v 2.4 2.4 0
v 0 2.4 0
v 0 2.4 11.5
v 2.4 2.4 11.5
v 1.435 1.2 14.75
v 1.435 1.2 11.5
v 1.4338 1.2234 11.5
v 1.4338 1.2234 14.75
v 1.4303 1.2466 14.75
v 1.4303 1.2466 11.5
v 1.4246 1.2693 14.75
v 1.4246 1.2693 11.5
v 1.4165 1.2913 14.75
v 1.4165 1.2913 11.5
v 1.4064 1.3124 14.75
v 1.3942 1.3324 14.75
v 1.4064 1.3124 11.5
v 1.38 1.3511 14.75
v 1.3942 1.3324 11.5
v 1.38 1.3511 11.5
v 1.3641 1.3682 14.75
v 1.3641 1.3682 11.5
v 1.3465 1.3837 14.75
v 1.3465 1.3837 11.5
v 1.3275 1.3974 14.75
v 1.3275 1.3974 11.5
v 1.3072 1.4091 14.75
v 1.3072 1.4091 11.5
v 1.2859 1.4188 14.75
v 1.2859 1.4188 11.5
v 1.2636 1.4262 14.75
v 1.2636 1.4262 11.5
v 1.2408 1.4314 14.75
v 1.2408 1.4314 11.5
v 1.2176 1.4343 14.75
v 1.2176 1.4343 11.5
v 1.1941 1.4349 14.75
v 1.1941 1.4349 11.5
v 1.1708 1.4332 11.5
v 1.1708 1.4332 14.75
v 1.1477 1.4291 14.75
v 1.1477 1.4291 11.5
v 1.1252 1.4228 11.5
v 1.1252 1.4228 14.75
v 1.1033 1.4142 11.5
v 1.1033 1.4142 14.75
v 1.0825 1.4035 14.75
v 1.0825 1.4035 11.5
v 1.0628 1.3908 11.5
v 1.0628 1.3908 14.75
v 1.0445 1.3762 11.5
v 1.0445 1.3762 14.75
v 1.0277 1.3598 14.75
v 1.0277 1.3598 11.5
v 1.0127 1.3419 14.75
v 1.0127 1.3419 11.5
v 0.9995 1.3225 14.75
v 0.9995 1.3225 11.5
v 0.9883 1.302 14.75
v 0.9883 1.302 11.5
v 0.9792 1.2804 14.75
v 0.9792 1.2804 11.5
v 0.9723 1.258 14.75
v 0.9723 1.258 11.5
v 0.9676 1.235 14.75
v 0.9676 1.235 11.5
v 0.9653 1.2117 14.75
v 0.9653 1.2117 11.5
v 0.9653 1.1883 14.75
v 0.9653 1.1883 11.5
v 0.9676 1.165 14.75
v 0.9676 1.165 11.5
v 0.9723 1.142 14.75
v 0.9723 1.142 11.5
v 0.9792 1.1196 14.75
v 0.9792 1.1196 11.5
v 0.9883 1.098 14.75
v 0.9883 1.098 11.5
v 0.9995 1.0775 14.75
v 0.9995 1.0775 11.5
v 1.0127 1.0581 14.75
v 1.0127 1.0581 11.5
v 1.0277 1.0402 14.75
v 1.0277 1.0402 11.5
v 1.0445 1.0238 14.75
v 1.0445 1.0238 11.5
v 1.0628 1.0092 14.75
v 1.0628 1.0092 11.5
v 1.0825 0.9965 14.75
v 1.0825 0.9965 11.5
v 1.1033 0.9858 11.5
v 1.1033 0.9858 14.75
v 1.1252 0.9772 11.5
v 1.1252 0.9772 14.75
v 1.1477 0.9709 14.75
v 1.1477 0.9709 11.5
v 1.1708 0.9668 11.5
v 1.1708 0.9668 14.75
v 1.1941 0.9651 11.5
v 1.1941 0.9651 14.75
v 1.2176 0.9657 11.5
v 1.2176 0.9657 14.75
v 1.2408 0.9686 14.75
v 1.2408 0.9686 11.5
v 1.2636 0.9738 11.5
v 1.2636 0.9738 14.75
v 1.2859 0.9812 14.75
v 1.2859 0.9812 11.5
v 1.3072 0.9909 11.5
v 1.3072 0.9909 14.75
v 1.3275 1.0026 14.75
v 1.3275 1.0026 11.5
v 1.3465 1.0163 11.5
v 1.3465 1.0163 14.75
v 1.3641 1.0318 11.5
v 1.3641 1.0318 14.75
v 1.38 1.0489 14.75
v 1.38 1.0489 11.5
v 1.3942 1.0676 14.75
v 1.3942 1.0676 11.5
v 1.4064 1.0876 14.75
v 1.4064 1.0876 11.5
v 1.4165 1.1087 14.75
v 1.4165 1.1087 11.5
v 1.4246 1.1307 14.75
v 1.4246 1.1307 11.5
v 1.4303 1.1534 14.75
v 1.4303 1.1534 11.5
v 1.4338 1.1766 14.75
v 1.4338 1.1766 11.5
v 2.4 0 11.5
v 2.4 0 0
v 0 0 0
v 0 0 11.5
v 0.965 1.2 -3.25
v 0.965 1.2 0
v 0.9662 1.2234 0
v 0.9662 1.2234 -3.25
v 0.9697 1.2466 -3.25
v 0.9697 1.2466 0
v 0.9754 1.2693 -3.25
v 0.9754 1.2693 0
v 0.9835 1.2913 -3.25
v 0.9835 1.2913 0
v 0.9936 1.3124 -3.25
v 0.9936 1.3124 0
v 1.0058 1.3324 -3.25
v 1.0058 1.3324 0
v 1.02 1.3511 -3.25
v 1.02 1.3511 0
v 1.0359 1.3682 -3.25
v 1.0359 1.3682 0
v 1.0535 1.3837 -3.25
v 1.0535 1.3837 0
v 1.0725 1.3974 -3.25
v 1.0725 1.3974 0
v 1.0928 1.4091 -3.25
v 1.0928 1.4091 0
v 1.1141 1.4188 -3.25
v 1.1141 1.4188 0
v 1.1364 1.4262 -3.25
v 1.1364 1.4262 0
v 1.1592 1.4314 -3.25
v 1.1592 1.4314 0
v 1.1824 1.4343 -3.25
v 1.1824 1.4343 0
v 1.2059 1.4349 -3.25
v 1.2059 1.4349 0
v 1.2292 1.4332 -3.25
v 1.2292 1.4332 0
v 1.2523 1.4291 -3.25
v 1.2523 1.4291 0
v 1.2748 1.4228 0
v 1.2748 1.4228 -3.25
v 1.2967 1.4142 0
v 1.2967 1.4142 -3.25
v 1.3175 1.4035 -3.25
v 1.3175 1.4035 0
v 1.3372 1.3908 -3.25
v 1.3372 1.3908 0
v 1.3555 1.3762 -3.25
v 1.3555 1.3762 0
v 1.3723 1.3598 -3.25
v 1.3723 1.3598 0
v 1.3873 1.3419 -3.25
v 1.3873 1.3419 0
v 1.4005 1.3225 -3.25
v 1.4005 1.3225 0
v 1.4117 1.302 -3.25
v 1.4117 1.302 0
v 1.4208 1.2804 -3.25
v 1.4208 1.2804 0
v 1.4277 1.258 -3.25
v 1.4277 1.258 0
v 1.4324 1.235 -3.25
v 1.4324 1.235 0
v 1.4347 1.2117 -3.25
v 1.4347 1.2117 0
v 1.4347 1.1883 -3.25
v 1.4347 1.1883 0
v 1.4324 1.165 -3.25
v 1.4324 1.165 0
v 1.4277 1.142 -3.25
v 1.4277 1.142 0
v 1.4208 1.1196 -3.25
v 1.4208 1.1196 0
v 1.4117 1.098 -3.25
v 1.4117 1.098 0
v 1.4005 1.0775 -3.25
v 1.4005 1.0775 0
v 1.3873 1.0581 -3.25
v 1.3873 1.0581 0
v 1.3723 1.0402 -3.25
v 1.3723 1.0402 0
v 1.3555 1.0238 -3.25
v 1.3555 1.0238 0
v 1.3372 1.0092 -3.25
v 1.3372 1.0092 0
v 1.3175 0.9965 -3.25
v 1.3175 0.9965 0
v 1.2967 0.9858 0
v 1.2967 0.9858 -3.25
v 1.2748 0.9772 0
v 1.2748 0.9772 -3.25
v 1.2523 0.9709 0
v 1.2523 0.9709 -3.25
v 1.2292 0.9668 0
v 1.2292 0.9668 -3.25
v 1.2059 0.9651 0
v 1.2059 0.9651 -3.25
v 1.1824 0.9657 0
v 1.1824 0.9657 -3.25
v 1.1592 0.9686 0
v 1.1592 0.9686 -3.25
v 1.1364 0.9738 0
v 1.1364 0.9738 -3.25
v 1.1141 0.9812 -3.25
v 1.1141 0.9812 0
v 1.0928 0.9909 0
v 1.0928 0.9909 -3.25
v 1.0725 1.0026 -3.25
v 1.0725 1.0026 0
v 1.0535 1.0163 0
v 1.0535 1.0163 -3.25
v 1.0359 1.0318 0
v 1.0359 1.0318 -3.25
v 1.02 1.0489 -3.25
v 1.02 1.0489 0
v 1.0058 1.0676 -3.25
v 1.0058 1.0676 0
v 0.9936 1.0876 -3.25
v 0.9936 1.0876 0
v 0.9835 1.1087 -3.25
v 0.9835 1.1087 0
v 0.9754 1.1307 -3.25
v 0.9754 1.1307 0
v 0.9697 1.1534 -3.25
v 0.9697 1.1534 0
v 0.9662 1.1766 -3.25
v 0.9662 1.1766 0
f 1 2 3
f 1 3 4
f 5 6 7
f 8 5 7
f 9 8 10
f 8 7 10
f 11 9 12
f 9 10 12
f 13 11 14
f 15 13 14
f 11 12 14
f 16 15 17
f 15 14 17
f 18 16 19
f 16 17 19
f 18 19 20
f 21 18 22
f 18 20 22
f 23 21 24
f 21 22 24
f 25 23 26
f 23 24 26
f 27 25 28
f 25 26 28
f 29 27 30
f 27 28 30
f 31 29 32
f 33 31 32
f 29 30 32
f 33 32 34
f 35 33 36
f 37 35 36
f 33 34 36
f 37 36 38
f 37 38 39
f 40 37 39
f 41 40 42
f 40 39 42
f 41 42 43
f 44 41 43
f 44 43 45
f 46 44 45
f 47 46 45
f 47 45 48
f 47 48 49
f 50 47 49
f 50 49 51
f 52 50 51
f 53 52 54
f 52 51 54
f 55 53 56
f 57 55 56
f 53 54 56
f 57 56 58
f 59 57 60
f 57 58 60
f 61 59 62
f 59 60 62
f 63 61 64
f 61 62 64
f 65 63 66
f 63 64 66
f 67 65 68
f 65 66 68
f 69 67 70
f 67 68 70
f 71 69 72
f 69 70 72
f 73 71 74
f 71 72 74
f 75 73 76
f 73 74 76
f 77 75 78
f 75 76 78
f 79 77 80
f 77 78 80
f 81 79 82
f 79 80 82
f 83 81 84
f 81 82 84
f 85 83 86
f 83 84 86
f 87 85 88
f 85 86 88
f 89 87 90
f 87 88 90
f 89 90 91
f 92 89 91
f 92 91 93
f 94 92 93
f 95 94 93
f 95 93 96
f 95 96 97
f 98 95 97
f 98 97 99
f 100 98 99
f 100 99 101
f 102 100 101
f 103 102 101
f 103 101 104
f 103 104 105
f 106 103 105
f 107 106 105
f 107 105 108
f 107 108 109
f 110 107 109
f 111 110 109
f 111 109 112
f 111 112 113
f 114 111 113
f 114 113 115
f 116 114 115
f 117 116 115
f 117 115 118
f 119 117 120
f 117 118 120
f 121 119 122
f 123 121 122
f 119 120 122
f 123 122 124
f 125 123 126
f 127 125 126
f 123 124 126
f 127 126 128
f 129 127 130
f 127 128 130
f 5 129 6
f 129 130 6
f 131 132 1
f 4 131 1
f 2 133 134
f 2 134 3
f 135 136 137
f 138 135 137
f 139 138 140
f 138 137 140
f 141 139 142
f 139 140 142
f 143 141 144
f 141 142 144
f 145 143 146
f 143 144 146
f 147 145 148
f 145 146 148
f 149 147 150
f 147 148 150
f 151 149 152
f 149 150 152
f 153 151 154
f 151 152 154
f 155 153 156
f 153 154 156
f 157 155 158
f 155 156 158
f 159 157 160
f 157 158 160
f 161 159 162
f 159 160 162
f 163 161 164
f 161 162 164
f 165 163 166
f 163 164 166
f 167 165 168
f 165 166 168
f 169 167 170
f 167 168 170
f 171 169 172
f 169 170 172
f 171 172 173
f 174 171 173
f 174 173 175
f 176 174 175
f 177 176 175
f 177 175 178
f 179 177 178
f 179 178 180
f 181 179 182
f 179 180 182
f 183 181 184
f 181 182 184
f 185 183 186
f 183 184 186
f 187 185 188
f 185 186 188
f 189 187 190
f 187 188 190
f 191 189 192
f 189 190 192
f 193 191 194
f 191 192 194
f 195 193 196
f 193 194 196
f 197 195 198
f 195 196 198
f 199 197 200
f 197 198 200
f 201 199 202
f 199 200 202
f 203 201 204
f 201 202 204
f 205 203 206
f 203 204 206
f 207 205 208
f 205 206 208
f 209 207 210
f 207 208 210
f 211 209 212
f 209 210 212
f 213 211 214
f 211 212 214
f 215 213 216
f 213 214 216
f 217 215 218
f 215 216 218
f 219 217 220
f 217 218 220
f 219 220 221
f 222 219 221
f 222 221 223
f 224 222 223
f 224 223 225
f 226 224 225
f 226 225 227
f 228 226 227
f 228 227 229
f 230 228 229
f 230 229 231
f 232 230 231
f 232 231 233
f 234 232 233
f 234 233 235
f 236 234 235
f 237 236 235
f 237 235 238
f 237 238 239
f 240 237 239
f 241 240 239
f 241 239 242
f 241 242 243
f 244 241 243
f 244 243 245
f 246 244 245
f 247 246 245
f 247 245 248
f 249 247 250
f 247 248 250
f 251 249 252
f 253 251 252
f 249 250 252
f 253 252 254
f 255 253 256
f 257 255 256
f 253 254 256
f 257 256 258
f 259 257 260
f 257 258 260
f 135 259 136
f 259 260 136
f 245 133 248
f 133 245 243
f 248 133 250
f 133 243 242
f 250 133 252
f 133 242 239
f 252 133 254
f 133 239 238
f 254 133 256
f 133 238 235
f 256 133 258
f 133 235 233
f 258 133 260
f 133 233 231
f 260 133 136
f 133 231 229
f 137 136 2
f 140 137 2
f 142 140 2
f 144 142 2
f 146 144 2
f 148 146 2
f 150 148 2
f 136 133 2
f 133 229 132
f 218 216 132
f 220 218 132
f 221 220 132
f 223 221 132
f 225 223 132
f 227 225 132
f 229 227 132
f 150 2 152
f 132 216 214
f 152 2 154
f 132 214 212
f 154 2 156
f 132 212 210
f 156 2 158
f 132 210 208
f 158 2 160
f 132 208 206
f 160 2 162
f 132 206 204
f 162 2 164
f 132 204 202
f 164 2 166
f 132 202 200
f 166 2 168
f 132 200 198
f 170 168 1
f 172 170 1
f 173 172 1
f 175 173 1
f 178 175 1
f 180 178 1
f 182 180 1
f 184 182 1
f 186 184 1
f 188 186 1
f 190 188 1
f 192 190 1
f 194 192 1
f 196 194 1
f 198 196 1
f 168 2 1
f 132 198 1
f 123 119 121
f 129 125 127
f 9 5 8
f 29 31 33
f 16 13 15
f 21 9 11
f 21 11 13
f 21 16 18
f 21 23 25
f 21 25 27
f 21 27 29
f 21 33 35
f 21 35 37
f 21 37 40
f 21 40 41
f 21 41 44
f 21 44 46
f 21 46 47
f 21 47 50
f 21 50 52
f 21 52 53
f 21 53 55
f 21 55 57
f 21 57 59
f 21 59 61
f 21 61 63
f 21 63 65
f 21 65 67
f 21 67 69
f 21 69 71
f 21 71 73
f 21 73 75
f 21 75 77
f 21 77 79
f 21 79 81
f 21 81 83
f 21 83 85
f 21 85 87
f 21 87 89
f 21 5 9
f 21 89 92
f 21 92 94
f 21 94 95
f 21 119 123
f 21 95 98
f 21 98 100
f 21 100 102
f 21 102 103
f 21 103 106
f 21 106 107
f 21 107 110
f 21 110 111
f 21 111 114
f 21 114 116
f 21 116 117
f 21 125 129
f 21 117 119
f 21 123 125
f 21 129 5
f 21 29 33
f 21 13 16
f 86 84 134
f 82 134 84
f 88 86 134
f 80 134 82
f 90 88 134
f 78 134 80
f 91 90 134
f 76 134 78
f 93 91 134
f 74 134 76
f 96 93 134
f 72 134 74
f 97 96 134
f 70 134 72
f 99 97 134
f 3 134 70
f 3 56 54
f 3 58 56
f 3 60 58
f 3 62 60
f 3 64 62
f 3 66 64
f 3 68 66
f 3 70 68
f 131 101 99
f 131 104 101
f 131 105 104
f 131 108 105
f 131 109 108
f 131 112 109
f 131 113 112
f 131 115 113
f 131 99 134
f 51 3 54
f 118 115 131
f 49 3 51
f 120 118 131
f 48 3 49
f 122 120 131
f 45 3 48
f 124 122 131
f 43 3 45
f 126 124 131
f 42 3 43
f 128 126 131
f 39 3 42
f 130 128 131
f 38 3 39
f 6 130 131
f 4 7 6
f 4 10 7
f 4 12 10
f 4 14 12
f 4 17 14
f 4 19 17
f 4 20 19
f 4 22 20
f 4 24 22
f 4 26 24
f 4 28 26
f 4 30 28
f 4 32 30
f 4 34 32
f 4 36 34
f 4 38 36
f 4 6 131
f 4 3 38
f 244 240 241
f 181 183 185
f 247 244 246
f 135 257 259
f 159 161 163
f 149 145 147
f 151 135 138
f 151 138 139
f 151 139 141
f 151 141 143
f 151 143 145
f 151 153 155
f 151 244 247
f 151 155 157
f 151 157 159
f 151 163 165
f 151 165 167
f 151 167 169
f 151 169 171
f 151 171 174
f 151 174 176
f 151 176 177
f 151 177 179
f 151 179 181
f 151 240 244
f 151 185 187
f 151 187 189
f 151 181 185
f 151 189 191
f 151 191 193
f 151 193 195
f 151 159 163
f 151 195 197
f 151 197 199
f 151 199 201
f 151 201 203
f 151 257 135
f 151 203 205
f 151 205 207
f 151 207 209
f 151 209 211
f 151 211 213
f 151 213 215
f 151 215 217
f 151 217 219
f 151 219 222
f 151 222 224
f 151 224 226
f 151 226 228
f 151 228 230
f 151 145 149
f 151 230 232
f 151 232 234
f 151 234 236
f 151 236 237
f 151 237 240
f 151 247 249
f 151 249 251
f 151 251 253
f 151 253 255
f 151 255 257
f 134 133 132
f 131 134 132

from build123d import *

# Parameters (mm, degrees)
SKETCH_1_W      = 2.4
SKETCH_1_H      = 2.4
EXTRUDE_1_DEPTH = 11.5
SKETCH_2_R      = 0.235
EXTRUDE_2_DEPTH = 3.25
SKETCH_3_R      = 0.235
EXTRUDE_3_DEPTH = 3.25


with BuildPart() as part:
    # ｽｹｯﾁ1 → ﾎﾞｽ - 押し出し1 (new body)
    with BuildSketch(Plane.XY):
        with Locations((1.2, 1.2)):
            Rectangle(SKETCH_1_W, SKETCH_1_H)
    extrude(amount=EXTRUDE_1_DEPTH)

    # ｽｹｯﾁ2 → ﾎﾞｽ - 押し出し2 (add)
    with BuildSketch(Plane.XY.offset(11.5)):
        with Locations((1.2, 1.2)):
            Circle(SKETCH_2_R)
    extrude(amount=EXTRUDE_2_DEPTH)

    # ｽｹｯﾁ3 → ﾎﾞｽ - 押し出し3 (add)
    with BuildSketch(Plane(origin=(0, 0, 0), x_dir=(-1, 0, 0), z_dir=(0, 0, -1))):
        with Locations((-1.2, 1.2)):
            Circle(SKETCH_3_R)
    extrude(amount=EXTRUDE_3_DEPTH)


solid = part.part
